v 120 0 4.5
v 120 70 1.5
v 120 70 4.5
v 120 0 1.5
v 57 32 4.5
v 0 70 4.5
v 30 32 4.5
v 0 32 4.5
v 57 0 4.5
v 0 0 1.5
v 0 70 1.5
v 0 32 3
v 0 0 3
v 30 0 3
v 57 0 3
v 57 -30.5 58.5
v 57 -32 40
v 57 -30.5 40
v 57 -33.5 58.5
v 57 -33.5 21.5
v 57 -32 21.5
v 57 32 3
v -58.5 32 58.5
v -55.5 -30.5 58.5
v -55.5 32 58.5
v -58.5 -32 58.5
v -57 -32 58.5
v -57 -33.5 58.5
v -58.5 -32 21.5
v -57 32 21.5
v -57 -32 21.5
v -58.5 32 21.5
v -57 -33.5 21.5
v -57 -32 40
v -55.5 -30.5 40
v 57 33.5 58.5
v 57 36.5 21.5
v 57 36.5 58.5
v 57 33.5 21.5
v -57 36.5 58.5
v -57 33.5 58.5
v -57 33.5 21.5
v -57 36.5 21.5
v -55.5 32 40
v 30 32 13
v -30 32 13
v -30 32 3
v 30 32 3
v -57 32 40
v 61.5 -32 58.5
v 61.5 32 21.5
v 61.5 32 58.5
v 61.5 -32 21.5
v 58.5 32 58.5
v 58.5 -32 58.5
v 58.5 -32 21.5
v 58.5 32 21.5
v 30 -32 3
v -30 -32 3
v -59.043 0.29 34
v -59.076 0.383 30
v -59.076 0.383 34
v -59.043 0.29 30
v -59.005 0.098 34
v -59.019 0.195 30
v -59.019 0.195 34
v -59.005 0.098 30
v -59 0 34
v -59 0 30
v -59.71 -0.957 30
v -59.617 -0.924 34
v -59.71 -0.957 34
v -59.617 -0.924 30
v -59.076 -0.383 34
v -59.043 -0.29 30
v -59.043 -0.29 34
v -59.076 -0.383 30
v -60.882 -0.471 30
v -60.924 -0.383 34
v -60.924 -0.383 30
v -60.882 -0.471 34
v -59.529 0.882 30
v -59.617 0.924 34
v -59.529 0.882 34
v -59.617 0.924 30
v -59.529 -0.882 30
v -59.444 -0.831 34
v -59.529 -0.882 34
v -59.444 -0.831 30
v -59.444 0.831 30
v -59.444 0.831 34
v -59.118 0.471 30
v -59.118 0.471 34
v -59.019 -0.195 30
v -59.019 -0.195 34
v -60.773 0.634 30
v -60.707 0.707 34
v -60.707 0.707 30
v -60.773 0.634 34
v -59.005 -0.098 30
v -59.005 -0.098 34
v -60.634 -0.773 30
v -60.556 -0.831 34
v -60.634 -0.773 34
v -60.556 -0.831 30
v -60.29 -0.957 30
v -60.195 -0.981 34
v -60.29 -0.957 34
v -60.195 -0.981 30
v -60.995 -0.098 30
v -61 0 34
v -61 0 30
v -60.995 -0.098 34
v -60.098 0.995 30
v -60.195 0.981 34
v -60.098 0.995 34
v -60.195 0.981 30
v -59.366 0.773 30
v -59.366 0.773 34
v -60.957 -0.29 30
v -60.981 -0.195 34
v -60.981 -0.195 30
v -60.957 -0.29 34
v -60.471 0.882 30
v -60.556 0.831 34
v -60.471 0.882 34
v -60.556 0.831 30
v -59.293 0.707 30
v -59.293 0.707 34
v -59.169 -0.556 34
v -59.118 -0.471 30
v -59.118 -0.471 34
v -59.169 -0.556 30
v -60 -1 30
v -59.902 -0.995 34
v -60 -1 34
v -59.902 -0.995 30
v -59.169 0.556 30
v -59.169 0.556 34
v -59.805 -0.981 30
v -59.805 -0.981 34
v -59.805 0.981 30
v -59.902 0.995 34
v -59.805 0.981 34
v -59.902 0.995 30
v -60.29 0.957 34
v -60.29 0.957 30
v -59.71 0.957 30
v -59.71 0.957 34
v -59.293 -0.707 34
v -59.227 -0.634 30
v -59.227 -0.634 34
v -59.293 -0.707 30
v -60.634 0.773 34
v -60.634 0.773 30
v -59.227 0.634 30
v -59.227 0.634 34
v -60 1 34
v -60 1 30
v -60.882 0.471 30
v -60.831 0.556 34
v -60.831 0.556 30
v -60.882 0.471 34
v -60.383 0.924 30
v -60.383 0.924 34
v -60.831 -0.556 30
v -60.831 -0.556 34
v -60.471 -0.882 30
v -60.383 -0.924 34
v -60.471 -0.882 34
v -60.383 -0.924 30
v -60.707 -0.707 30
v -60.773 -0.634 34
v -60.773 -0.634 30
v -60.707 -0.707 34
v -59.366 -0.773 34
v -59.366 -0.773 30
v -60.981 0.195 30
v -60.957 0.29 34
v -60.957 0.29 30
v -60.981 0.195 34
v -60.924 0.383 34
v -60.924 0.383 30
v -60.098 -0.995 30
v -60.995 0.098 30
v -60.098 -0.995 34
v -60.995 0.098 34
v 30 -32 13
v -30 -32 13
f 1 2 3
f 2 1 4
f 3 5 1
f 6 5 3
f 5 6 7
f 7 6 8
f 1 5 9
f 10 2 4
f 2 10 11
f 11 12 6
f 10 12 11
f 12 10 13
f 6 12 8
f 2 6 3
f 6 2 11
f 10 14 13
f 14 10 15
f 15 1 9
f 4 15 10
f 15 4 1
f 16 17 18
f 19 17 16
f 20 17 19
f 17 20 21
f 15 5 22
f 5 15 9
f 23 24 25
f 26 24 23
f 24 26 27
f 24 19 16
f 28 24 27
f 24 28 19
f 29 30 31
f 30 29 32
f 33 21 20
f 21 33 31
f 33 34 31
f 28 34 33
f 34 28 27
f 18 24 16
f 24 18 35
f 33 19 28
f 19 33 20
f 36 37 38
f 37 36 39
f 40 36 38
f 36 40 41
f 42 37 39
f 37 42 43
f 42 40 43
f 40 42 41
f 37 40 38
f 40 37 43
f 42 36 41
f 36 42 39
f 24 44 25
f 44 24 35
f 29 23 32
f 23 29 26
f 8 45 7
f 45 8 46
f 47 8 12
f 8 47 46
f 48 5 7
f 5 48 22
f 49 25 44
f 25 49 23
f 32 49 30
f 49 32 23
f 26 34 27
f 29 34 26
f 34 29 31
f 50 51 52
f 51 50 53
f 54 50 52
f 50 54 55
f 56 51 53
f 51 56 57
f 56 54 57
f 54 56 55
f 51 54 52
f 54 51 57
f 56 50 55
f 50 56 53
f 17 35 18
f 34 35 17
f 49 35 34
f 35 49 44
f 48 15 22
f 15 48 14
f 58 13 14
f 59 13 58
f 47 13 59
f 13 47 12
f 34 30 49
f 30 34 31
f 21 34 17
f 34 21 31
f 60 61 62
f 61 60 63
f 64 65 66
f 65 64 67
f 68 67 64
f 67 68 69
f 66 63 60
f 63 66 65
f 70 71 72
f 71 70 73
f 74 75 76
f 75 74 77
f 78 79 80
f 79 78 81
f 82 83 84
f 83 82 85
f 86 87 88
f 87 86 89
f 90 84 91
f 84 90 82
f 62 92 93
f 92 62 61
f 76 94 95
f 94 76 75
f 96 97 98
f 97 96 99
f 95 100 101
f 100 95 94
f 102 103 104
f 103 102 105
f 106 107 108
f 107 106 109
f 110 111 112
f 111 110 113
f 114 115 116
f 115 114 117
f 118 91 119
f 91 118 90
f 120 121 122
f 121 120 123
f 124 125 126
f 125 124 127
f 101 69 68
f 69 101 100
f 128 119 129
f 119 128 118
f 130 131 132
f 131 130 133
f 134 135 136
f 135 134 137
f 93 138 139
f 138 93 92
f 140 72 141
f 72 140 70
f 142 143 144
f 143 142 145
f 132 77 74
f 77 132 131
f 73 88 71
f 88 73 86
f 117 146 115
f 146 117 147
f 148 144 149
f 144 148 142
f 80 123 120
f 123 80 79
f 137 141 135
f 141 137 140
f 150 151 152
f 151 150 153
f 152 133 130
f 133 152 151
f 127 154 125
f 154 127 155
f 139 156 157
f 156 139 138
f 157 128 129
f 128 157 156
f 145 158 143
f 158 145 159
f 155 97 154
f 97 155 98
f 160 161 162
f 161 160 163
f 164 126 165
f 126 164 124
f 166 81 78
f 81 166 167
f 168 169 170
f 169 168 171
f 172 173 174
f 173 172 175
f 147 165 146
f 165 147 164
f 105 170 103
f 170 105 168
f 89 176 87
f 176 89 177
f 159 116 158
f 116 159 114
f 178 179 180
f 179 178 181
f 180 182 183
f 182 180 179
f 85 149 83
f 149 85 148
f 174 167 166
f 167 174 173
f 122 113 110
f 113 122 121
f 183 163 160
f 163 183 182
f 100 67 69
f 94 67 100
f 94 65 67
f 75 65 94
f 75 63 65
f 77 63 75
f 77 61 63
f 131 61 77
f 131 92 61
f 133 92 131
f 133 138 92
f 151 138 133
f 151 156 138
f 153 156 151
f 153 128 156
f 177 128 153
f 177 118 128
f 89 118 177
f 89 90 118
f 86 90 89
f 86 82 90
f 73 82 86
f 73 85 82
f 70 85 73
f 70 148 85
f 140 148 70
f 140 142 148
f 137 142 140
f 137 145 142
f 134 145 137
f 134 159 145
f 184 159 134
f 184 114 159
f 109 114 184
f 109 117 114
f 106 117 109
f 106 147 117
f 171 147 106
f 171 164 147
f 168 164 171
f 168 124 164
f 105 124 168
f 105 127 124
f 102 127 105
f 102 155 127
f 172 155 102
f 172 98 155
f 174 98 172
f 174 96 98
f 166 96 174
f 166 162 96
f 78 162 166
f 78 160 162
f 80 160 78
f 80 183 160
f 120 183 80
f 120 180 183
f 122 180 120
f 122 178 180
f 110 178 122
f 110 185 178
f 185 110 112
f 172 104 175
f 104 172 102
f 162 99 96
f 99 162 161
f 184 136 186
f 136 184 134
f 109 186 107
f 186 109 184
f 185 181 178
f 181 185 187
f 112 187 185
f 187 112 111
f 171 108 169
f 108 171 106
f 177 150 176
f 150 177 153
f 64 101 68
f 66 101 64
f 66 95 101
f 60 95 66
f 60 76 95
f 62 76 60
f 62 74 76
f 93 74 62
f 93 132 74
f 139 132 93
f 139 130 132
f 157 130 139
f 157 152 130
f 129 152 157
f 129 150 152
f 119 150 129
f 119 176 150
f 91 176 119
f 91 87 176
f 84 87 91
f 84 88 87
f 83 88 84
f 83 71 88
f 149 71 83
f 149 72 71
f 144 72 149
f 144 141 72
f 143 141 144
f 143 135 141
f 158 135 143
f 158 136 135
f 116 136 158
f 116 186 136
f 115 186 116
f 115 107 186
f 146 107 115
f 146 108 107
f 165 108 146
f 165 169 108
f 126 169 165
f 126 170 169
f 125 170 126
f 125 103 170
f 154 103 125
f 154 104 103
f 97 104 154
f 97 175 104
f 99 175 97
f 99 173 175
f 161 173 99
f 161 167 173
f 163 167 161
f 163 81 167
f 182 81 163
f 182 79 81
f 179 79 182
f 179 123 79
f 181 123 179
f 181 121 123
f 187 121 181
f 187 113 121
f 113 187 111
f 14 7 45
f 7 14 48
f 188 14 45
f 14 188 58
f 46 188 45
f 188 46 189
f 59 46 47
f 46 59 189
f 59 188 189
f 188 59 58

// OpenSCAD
$fn = 64;

// Outer dimensions
outer_x = 120;
outer_y = 70;
outer_z = 40;

// Wall and floor thickness
wall_thick = 3;
floor_thick = 3;

// Platform dimensions
platform_x = 60;
platform_top_z = 13;

// Hole dimensions
hole_diam = 2;
hole_z = 30;
hole_y = 0;

// Derived dimensions
inner_x = outer_x - 2 * wall_thick;
inner_y = outer_y - 2 * wall_thick;
inner_z = outer_z - floor_thick;
platform_y = inner_y;
platform_z_height = platform_top_z - floor_thick;

// Tank shell (floor + 4 walls)
module tank_shell() {
    union() {
        // Floor
        translate([0, 0, floor_thick / 2]) cube([outer_x, outer_y, floor_thick], center = false);
        // Back wall (Y negative)
        translate([-inner_x / 2, -outer_y / 2 + wall_thick / 2, floor_thick + inner_z / 2]) cube([inner_x, wall_thick, inner_z], center = false);
        // Front wall (Y positive)
        translate([-inner_x / 2, outer_y / 2 - wall_thick / 2, floor_thick + inner_z / 2]) cube([inner_x, wall_thick, inner_z], center = false);
        // Left wall (X negative)
        translate([-outer_x / 2 + wall_thick / 2, -inner_y / 2, floor_thick + inner_z / 2]) cube([wall_thick, inner_y, inner_z], center = false);
        // Right wall (X positive)
        translate([outer_x / 2 - wall_thick / 2, -inner_y / 2, floor_thick + inner_z / 2]) cube([wall_thick, inner_y, inner_z], center = false);
    }
}

// Cut out the inner cavity
difference() {
    tank_shell();
    translate([-inner_x / 2, -inner_y / 2, floor_thick]) cube([inner_x, inner_y, inner_z], center = false);
}

// Add the raised platform
translate([-platform_x / 2, -inner_y / 2, floor_thick]) cube([platform_x, platform_y, platform_z_height], center = false);

// Drill electrode holes through the end walls
for (x_pos = [-outer_x / 2, outer_x / 2]) {
    translate([x_pos, hole_y, hole_z]) cylinder(r = hole_diam / 2, h = 4, center = false);
}
